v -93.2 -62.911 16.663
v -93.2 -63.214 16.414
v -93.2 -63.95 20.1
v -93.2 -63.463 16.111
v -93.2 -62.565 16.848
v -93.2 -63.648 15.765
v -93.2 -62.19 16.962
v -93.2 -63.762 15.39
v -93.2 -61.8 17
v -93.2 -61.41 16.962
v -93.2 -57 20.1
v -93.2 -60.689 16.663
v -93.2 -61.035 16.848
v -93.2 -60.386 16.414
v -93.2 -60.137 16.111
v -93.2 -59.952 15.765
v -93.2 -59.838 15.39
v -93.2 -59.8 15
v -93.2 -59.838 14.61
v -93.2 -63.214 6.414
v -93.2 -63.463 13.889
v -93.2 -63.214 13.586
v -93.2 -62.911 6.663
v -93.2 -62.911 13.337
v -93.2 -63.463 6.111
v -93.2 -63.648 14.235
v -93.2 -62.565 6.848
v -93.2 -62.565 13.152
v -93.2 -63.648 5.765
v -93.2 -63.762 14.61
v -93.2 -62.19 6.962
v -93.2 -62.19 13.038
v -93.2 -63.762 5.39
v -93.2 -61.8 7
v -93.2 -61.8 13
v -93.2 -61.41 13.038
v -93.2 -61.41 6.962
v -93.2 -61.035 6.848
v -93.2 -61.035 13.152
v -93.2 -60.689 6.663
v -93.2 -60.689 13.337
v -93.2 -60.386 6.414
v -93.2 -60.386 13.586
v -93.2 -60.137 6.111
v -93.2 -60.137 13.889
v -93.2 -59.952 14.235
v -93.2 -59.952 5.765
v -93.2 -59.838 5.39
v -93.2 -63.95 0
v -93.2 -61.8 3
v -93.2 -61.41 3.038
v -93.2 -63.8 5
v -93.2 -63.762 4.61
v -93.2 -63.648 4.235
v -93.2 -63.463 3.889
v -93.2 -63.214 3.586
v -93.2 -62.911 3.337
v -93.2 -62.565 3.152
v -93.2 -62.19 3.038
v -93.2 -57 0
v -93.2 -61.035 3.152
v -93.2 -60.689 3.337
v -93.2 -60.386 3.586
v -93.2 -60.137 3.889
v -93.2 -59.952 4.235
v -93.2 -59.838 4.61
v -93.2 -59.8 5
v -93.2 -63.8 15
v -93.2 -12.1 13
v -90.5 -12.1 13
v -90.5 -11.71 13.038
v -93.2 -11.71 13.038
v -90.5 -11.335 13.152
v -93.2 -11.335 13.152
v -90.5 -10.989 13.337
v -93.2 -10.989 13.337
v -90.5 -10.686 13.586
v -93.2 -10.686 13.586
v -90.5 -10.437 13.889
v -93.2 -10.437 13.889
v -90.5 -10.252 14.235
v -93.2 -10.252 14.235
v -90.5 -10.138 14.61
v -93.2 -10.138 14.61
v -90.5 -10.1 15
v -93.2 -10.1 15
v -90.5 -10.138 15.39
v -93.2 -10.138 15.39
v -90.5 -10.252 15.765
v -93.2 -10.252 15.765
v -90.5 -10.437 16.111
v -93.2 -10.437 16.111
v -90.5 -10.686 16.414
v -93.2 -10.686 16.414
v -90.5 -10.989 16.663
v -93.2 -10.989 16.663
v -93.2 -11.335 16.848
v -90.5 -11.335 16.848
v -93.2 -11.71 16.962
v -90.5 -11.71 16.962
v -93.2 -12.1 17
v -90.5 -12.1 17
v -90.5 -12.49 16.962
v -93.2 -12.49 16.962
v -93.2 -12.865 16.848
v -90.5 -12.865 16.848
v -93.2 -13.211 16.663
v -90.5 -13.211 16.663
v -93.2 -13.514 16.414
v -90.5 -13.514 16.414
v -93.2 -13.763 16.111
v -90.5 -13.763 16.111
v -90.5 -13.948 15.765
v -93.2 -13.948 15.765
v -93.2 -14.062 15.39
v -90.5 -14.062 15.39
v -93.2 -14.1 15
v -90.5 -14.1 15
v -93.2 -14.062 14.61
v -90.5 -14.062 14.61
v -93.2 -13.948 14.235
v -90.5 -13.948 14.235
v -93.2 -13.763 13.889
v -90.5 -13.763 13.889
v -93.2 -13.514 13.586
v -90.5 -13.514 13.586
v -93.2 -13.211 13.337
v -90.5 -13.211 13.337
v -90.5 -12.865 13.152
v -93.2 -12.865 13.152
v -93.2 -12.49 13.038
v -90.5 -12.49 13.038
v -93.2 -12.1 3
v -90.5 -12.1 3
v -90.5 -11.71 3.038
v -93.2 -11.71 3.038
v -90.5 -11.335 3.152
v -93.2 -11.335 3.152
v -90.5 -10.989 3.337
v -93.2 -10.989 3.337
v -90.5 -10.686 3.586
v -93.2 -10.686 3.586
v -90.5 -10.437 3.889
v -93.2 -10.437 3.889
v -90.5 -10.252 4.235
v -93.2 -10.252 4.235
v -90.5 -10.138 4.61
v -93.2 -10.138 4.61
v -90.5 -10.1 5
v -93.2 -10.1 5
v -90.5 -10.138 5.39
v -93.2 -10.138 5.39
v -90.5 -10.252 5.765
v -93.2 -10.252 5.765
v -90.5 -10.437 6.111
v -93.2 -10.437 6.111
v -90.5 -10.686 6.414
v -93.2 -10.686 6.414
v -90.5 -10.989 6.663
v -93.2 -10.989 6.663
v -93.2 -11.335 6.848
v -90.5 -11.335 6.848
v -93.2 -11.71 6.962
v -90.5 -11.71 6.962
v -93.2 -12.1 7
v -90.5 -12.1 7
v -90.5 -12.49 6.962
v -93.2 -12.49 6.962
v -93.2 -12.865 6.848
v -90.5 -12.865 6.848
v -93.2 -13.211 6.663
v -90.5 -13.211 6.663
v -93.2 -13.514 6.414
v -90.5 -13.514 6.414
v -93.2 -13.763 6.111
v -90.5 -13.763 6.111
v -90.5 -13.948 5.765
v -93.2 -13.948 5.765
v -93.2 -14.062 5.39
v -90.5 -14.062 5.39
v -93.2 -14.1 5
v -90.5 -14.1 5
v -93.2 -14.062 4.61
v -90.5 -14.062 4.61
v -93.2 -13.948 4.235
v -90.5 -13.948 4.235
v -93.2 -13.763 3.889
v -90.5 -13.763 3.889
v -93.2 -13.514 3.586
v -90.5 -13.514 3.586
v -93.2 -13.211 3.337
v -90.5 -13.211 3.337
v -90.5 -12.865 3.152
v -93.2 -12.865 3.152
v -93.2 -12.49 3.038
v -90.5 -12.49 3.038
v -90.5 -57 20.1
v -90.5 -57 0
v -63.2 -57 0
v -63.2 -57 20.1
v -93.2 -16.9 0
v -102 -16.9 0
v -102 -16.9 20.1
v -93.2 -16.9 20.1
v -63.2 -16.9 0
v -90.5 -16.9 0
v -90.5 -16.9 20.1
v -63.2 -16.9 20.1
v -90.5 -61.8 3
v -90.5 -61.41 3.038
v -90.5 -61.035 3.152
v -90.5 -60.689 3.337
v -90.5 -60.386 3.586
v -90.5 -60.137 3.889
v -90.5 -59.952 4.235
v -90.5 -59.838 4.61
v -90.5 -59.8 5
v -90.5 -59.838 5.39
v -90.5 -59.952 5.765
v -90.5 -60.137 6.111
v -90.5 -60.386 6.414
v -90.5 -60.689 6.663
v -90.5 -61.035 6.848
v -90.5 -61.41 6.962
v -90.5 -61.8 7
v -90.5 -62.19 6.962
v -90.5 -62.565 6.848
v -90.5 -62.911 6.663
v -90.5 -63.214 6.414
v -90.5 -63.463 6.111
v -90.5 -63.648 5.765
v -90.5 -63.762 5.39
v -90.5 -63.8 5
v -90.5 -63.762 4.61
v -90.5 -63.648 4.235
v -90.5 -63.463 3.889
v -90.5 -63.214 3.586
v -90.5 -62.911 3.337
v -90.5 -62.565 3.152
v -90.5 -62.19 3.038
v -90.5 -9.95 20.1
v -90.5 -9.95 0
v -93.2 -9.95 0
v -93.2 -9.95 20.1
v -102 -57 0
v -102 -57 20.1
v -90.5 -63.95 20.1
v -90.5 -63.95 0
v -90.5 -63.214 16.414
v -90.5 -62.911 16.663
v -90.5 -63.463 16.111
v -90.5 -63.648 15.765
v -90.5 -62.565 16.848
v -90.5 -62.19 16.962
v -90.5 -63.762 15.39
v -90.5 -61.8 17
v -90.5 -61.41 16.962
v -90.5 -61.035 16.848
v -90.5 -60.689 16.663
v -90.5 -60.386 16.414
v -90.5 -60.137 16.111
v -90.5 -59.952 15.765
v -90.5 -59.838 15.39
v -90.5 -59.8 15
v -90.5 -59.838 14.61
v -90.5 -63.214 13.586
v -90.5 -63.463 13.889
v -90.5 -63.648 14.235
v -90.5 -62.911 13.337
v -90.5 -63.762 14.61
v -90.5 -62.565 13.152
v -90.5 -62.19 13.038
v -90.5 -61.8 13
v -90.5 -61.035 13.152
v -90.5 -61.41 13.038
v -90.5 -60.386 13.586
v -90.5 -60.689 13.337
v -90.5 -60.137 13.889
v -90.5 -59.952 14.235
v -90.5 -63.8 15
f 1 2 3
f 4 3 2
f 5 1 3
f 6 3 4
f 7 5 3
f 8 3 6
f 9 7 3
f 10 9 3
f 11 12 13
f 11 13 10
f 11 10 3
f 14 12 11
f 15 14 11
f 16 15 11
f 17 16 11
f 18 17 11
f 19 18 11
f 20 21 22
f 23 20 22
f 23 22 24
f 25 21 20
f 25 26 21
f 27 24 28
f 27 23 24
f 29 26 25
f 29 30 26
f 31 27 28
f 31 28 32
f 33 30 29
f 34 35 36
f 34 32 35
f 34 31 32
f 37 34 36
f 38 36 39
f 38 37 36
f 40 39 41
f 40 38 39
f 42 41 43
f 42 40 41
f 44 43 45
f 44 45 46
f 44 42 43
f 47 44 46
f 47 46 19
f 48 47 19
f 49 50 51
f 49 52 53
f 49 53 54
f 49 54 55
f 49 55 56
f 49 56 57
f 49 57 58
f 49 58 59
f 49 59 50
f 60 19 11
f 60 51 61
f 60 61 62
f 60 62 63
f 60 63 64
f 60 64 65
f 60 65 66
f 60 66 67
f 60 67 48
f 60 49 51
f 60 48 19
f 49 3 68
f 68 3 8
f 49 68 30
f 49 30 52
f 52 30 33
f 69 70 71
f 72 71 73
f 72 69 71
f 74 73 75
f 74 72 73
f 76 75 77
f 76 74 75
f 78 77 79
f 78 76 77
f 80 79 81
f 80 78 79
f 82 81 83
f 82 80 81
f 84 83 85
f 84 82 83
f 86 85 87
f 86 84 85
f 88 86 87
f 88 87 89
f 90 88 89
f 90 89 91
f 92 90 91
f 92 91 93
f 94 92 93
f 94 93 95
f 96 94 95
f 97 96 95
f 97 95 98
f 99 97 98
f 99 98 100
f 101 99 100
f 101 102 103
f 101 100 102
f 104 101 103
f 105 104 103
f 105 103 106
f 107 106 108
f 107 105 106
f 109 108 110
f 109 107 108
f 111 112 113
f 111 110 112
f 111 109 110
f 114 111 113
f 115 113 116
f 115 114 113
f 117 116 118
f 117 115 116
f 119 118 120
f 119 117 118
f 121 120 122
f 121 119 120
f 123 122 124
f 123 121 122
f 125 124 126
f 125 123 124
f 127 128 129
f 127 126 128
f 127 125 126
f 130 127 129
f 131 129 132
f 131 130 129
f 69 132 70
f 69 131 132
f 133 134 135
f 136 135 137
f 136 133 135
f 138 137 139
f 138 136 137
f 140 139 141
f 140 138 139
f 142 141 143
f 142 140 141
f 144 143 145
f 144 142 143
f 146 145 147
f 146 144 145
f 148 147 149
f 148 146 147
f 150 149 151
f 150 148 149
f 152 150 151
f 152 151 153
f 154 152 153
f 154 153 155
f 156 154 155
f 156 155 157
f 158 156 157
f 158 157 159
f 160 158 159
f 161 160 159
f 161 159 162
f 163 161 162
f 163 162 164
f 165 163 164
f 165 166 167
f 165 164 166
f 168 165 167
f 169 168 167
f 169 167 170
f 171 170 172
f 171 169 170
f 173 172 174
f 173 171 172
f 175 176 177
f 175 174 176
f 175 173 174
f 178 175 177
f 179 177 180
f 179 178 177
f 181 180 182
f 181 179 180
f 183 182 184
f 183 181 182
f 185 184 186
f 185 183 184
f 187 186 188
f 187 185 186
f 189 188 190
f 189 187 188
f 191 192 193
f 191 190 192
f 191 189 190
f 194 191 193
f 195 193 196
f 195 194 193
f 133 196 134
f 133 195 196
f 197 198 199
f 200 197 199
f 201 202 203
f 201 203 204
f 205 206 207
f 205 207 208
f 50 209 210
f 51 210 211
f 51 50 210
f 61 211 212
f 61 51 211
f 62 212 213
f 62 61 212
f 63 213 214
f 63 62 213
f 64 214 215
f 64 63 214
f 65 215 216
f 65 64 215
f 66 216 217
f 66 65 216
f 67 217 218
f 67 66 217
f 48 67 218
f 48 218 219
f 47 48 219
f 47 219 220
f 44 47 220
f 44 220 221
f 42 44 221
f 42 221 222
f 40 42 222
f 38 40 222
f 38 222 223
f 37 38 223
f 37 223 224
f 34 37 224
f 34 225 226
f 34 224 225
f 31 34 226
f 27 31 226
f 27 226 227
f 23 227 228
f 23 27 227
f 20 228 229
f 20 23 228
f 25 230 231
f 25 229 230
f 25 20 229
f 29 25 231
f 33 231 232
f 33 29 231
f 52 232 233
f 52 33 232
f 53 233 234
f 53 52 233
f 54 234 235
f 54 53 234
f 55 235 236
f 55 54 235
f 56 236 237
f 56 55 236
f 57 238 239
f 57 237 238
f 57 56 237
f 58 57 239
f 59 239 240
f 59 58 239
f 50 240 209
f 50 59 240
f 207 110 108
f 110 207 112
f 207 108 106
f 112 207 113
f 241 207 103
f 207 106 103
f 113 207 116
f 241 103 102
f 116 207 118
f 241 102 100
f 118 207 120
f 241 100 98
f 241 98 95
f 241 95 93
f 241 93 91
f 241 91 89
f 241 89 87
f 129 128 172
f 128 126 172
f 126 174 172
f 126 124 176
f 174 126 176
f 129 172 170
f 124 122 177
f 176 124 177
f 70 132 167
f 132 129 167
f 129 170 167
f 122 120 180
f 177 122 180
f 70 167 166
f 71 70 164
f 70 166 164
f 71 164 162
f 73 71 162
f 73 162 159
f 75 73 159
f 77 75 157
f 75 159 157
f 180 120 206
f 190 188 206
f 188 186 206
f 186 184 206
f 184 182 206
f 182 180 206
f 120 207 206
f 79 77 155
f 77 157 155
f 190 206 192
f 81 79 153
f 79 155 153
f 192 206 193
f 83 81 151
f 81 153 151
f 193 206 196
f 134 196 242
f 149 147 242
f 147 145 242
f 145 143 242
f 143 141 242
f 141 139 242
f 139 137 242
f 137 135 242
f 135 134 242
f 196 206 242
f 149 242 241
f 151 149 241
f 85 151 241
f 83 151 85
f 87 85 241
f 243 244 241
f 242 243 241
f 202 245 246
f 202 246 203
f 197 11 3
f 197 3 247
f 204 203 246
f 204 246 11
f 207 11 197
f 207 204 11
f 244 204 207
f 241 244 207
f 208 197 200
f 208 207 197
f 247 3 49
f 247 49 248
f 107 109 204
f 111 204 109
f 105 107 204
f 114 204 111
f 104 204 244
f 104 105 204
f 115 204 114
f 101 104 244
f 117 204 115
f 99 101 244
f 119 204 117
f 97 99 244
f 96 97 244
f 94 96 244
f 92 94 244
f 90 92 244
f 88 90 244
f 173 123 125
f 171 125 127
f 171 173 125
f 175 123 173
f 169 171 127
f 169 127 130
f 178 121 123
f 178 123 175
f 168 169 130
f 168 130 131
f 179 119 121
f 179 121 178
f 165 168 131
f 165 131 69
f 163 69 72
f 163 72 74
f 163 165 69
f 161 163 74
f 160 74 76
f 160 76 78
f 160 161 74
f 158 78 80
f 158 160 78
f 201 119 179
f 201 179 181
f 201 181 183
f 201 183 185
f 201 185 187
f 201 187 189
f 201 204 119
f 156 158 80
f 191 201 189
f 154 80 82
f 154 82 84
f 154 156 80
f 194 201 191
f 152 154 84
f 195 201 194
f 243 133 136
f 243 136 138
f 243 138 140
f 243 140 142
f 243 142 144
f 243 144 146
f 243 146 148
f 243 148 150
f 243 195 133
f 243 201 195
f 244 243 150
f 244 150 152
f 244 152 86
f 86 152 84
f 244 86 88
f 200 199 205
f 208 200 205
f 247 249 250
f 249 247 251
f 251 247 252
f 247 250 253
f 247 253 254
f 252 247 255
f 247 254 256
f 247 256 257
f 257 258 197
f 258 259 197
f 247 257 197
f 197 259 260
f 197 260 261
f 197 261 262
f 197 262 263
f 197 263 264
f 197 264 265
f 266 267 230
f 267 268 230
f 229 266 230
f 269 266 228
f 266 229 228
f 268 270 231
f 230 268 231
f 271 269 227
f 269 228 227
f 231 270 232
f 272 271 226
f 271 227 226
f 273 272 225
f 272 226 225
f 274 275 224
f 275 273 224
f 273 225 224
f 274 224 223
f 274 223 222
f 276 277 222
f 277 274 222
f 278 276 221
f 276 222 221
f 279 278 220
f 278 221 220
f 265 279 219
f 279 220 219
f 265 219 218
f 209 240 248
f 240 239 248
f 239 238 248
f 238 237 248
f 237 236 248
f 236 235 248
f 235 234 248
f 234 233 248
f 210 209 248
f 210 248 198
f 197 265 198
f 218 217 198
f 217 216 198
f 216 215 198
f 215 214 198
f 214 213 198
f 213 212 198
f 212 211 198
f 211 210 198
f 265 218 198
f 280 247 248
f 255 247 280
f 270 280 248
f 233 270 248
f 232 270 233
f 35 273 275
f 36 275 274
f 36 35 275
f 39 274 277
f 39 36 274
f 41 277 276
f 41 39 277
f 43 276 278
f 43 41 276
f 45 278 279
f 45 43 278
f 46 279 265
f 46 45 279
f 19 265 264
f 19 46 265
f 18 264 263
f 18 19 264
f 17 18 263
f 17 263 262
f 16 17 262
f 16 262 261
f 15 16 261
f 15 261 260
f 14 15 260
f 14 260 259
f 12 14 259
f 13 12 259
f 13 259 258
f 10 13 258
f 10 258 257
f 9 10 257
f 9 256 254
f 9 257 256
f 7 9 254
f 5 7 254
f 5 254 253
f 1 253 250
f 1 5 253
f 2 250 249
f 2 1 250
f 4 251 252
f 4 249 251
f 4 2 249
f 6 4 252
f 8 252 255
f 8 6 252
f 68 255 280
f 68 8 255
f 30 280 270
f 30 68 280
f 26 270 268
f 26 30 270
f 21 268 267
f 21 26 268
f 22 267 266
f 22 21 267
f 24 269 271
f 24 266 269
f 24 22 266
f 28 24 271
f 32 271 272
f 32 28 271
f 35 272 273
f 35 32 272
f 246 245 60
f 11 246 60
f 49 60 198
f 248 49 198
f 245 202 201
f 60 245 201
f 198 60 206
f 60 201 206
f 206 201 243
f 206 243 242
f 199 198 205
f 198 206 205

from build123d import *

# Parameters (mm, degrees)
CYLINDER178_R     = 2
CYLINDER178_DEPTH = 20
CYLINDER177_R     = 2
CYLINDER177_DEPTH = 20
CYLINDER175_R     = 2
CYLINDER175_DEPTH = 20
CYLINDER176_R     = 2
CYLINDER176_DEPTH = 20
BOX069_W          = 38.8
BOX069_H          = 40.1
BOX069_DEPTH      = 20.1
BOX084_W          = 2.7
BOX084_H          = 54
BOX084_DEPTH      = 20.1


with BuildPart() as cylinder178:
    # Cylinder178 → Cylinder178 (new body)
    with BuildSketch(Plane(origin=(-97.2, -71.8, 5), x_dir=(0, 0, -1), z_dir=(1, 0, 0))):
        Circle(CYLINDER178_R)
    extrude(amount=CYLINDER178_DEPTH)


with BuildPart() as cylinder177:
    # Cylinder177 → Cylinder177 (new body)
    with BuildSketch(Plane(origin=(-97.2, -71.8, 15), x_dir=(0, 0, -1), z_dir=(1, 0, 0))):
        Circle(CYLINDER177_R)
    extrude(amount=CYLINDER177_DEPTH)


with BuildPart() as cylinder175:
    # Cylinder175 → Cylinder175 (new body)
    with BuildSketch(Plane(origin=(-97.2, -22.1, 5), x_dir=(0, 0, -1), z_dir=(1, 0, 0))):
        Circle(CYLINDER175_R)
    extrude(amount=CYLINDER175_DEPTH)


with BuildPart() as cylinder176:
    # Cylinder176 → Cylinder176 (new body)
    with BuildSketch(Plane(origin=(-97.2, -22.1, 15), x_dir=(0, 0, -1), z_dir=(1, 0, 0))):
        Circle(CYLINDER176_R)
    extrude(amount=CYLINDER176_DEPTH)


with BuildPart() as box069:
    # Box069 → Box069 (new body)
    with BuildSketch(Plane(origin=(82, -93, 0), x_dir=(1, 0, 0), z_dir=(0, 0, 1))):
        with Locations((19.4, 20.05)):
            Rectangle(BOX069_W, BOX069_H)
    extrude(amount=BOX069_DEPTH)


with BuildPart() as cut131:
    # Box084 → Box084 (new body)
    with BuildSketch(Plane(origin=(90.8, -99.95, 0), x_dir=(1, 0, 0), z_dir=(0, 0, 1))):
        with Locations((1.35, 27)):
            Rectangle(BOX084_W, BOX084_H)
    extrude(amount=BOX084_DEPTH)

    # Fusion084: union Box069
    add(box069.part)


with BuildPart() as cut131_1:
    # Fusion084 placement: moved
    add(cut131.part.moved(Location((-188, 26, 0))))

    # Cut128: cut Cylinder176
    add(cylinder176.part, mode=Mode.SUBTRACT)

    # Cut129: cut Cylinder175
    add(cylinder175.part, mode=Mode.SUBTRACT)

    # Cut130: cut Cylinder177
    add(cylinder177.part, mode=Mode.SUBTRACT)

    # Cut131: cut Cylinder178
    add(cylinder178.part, mode=Mode.SUBTRACT)


with BuildPart() as cut131_2:
    # Cut131 placement: moved
    add(cut131_1.part.moved(Location((4, 10, 0))))


solid = cut131_2.part
